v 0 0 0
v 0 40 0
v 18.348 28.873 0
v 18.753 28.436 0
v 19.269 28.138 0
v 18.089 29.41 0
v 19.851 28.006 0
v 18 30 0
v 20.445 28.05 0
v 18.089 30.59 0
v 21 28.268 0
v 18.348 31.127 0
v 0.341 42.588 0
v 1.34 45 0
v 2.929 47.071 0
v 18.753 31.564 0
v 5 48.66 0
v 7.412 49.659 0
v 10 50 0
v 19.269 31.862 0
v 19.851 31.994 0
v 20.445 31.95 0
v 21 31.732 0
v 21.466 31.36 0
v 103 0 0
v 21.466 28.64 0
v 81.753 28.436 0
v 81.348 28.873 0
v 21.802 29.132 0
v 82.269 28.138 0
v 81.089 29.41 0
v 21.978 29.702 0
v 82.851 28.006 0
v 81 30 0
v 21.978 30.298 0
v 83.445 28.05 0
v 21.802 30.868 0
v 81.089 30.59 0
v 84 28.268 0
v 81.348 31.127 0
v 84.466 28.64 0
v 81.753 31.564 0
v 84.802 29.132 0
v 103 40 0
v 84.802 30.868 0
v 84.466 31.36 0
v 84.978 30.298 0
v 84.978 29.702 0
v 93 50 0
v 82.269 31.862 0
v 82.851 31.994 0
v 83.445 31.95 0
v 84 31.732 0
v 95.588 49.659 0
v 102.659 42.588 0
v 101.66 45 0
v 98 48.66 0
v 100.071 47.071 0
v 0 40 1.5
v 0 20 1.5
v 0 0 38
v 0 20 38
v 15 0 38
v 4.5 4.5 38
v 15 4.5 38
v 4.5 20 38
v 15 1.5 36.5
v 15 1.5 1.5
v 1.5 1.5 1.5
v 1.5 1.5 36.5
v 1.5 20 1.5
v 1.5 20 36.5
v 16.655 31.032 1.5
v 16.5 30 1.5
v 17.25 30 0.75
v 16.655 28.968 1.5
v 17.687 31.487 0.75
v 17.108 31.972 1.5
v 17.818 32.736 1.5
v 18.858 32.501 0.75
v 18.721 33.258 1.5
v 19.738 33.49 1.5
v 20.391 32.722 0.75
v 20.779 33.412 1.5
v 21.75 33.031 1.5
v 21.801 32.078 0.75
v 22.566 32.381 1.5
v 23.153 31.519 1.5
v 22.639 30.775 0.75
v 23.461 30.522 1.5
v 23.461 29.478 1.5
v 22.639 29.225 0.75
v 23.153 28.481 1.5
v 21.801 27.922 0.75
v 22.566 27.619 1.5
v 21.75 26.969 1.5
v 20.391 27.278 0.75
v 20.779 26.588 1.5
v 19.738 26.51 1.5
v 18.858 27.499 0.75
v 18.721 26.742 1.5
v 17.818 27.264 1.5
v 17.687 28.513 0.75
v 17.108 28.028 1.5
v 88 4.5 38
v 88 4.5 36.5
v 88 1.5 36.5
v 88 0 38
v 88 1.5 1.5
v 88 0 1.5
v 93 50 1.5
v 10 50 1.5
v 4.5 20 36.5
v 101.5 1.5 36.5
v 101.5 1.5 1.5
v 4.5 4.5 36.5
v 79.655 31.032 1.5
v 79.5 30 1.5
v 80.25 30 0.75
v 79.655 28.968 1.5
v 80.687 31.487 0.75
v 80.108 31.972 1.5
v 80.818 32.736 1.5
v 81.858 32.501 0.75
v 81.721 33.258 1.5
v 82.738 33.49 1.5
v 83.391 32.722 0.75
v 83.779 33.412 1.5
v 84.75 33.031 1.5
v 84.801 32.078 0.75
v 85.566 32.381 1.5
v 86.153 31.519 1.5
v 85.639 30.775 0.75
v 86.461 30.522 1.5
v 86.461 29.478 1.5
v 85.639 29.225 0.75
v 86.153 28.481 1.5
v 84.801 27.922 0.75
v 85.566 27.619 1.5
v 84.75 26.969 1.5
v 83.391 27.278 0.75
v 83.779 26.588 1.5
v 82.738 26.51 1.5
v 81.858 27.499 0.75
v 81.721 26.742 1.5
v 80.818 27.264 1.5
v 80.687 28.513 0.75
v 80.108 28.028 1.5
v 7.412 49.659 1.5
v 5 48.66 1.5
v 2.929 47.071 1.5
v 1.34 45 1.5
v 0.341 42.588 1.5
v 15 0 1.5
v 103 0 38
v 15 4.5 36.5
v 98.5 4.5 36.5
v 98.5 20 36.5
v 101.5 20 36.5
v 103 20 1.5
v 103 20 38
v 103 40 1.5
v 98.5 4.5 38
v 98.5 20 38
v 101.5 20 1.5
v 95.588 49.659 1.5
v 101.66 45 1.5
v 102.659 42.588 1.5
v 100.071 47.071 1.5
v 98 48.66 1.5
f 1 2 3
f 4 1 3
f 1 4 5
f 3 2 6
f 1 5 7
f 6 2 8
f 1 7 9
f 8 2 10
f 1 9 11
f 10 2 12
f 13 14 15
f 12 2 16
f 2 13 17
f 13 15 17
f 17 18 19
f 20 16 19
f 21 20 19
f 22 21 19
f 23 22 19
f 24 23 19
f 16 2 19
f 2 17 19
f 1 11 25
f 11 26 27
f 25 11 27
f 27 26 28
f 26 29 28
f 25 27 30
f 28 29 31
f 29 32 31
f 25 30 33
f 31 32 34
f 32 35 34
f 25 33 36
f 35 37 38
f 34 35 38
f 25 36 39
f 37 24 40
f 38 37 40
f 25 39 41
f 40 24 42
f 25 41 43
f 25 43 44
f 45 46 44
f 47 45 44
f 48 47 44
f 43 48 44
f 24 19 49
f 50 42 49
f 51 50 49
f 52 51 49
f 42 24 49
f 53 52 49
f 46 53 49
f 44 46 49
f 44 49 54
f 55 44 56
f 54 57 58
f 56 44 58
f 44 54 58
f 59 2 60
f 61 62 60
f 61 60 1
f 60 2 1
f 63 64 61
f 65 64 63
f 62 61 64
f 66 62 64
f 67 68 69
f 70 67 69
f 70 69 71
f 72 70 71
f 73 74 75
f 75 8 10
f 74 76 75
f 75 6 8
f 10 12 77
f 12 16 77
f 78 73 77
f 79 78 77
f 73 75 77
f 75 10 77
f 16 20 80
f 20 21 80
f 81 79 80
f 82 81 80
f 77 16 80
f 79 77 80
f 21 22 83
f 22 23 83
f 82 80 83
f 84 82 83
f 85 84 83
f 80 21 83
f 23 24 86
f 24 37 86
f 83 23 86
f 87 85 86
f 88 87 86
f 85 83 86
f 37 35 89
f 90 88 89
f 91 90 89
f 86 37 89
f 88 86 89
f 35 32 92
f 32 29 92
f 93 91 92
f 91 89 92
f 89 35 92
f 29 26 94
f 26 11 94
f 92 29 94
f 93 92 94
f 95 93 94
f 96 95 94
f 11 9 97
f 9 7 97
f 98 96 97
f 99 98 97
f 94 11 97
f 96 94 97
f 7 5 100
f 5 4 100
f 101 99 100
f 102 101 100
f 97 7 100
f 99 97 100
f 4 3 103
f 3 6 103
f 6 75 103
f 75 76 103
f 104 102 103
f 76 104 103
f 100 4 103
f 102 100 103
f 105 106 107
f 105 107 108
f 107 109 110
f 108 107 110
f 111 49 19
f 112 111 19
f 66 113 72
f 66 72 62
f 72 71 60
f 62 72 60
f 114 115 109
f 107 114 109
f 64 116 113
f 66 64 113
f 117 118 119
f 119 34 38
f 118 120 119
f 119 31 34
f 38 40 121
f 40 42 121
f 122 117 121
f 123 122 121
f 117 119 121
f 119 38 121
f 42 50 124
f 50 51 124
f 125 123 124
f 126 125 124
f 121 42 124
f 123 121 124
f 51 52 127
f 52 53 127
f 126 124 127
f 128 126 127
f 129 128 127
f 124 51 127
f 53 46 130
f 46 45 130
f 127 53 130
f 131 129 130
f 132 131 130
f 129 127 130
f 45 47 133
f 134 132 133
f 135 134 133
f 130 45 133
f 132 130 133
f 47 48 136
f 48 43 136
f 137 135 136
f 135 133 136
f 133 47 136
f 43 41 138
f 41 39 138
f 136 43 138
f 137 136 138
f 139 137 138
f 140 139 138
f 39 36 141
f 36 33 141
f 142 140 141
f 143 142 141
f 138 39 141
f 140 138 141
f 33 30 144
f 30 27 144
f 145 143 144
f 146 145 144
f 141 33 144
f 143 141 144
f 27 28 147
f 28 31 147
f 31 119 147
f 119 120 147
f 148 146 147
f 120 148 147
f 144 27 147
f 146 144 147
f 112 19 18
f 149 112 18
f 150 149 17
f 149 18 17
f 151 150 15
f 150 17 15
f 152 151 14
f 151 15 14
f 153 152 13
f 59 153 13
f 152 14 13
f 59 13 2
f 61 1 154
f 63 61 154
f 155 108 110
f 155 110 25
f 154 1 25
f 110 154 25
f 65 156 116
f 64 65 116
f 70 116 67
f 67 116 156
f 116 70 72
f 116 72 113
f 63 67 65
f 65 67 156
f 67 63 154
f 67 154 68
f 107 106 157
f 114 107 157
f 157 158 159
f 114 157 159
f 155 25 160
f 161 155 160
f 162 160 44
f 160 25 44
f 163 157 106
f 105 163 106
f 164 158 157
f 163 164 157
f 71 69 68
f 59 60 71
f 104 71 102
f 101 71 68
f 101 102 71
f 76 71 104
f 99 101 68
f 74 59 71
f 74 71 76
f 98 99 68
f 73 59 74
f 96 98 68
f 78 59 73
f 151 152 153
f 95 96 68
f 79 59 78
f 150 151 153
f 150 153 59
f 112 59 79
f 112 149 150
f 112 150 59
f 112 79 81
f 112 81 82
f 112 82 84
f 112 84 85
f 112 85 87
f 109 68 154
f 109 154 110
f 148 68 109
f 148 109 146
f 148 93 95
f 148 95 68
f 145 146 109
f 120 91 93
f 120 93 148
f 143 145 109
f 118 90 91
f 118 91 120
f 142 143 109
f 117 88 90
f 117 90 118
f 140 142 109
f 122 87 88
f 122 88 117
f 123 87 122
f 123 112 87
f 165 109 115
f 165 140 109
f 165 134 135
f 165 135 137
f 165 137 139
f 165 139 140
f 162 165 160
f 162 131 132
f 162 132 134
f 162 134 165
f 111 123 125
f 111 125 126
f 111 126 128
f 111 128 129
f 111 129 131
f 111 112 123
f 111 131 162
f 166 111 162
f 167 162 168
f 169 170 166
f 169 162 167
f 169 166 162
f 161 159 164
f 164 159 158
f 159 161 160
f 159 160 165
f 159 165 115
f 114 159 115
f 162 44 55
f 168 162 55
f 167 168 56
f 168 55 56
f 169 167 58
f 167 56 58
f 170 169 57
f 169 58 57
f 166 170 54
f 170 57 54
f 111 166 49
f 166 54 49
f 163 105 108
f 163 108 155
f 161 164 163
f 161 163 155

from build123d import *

# Parameters (mm, degrees)
F3_DEPTH       = 1.5
F4_DEPTH       = 38
F5_START       = 36.5
F5_DEPTH       = 1.5
F7_D           = 4
F7_CSINK_D     = 7
F7_CSINK_ANGLE = 90


with BuildPart() as f3:
    # F2 (on Top) → F3 (new body)
    with BuildSketch(Plane.XY):
        with BuildLine():
            Line((15, 1.5), (15, 0))
            Line((15, 0), (88, 0))
            Line((88, 0), (88, 1.5))
            Line((88, 1.5), (88, 4.5))
            Line((88, 4.5), (98.5, 4.5))
            Line((98.5, 4.5), (98.5, 20))
            Line((98.5, 20), (101.5, 20))
            Line((101.5, 20), (103, 20))
            Line((103, 20), (103, 40))
            ThreePointArc((103, 40), (100.0710678119, 47.0710678119), (93, 50))
            Line((93, 50), (10, 50))
            ThreePointArc((10, 50), (2.9289321881, 47.0710678119), (0, 40))
            Line((0, 40), (0, 20))
            Line((0, 20), (1.5, 20))
            Line((1.5, 20), (4.5, 20))
            Line((4.5, 20), (4.5, 4.5))
            Line((4.5, 4.5), (15, 4.5))
            Line((15, 4.5), (15, 1.5))
        make_face()
        Polygon((1.5, 1.5), (15, 1.5), (15, 4.5), (4.5, 4.5), (4.5, 20), (1.5, 20), align=None)
        Polygon((88, 4.5), (88, 1.5), (101.5, 1.5), (101.5, 20), (98.5, 20), (98.5, 4.5), align=None)
        Polygon((88, 1.5), (88, 0), (103, 0), (103, 20), (101.5, 20), (101.5, 1.5), align=None)
        Polygon((0, 20), (0, 0), (15, 0), (15, 1.5), (1.5, 1.5), (1.5, 20), align=None)
    extrude(amount=F3_DEPTH)

    # F2 (on Top) → F4 (join)
    with BuildSketch(Plane.XY):
        Polygon((0, 20), (0, 0), (15, 0), (15, 1.5), (1.5, 1.5), (1.5, 20), align=None)
        Polygon((88, 1.5), (88, 0), (103, 0), (103, 20), (101.5, 20), (101.5, 1.5), align=None)
    extrude(amount=F4_DEPTH)

    # F2 (on Top) → F5 (join)
    with BuildSketch(Plane.XY.offset(F5_START)):
        Polygon((88, 4.5), (88, 1.5), (101.5, 1.5), (101.5, 20), (98.5, 20), (98.5, 4.5), align=None)
        Polygon((1.5, 1.5), (15, 1.5), (15, 4.5), (4.5, 4.5), (4.5, 20), (1.5, 20), align=None)
    extrude(amount=F5_DEPTH)

    # F7 (through all)
    with Locations(Plane.XY.offset(1.5)):
        with Locations((20, 30), (83, 30)):
            CounterSinkHole(F7_D / 2, F7_CSINK_D / 2, counter_sink_angle=F7_CSINK_ANGLE)


solid = f3.part
